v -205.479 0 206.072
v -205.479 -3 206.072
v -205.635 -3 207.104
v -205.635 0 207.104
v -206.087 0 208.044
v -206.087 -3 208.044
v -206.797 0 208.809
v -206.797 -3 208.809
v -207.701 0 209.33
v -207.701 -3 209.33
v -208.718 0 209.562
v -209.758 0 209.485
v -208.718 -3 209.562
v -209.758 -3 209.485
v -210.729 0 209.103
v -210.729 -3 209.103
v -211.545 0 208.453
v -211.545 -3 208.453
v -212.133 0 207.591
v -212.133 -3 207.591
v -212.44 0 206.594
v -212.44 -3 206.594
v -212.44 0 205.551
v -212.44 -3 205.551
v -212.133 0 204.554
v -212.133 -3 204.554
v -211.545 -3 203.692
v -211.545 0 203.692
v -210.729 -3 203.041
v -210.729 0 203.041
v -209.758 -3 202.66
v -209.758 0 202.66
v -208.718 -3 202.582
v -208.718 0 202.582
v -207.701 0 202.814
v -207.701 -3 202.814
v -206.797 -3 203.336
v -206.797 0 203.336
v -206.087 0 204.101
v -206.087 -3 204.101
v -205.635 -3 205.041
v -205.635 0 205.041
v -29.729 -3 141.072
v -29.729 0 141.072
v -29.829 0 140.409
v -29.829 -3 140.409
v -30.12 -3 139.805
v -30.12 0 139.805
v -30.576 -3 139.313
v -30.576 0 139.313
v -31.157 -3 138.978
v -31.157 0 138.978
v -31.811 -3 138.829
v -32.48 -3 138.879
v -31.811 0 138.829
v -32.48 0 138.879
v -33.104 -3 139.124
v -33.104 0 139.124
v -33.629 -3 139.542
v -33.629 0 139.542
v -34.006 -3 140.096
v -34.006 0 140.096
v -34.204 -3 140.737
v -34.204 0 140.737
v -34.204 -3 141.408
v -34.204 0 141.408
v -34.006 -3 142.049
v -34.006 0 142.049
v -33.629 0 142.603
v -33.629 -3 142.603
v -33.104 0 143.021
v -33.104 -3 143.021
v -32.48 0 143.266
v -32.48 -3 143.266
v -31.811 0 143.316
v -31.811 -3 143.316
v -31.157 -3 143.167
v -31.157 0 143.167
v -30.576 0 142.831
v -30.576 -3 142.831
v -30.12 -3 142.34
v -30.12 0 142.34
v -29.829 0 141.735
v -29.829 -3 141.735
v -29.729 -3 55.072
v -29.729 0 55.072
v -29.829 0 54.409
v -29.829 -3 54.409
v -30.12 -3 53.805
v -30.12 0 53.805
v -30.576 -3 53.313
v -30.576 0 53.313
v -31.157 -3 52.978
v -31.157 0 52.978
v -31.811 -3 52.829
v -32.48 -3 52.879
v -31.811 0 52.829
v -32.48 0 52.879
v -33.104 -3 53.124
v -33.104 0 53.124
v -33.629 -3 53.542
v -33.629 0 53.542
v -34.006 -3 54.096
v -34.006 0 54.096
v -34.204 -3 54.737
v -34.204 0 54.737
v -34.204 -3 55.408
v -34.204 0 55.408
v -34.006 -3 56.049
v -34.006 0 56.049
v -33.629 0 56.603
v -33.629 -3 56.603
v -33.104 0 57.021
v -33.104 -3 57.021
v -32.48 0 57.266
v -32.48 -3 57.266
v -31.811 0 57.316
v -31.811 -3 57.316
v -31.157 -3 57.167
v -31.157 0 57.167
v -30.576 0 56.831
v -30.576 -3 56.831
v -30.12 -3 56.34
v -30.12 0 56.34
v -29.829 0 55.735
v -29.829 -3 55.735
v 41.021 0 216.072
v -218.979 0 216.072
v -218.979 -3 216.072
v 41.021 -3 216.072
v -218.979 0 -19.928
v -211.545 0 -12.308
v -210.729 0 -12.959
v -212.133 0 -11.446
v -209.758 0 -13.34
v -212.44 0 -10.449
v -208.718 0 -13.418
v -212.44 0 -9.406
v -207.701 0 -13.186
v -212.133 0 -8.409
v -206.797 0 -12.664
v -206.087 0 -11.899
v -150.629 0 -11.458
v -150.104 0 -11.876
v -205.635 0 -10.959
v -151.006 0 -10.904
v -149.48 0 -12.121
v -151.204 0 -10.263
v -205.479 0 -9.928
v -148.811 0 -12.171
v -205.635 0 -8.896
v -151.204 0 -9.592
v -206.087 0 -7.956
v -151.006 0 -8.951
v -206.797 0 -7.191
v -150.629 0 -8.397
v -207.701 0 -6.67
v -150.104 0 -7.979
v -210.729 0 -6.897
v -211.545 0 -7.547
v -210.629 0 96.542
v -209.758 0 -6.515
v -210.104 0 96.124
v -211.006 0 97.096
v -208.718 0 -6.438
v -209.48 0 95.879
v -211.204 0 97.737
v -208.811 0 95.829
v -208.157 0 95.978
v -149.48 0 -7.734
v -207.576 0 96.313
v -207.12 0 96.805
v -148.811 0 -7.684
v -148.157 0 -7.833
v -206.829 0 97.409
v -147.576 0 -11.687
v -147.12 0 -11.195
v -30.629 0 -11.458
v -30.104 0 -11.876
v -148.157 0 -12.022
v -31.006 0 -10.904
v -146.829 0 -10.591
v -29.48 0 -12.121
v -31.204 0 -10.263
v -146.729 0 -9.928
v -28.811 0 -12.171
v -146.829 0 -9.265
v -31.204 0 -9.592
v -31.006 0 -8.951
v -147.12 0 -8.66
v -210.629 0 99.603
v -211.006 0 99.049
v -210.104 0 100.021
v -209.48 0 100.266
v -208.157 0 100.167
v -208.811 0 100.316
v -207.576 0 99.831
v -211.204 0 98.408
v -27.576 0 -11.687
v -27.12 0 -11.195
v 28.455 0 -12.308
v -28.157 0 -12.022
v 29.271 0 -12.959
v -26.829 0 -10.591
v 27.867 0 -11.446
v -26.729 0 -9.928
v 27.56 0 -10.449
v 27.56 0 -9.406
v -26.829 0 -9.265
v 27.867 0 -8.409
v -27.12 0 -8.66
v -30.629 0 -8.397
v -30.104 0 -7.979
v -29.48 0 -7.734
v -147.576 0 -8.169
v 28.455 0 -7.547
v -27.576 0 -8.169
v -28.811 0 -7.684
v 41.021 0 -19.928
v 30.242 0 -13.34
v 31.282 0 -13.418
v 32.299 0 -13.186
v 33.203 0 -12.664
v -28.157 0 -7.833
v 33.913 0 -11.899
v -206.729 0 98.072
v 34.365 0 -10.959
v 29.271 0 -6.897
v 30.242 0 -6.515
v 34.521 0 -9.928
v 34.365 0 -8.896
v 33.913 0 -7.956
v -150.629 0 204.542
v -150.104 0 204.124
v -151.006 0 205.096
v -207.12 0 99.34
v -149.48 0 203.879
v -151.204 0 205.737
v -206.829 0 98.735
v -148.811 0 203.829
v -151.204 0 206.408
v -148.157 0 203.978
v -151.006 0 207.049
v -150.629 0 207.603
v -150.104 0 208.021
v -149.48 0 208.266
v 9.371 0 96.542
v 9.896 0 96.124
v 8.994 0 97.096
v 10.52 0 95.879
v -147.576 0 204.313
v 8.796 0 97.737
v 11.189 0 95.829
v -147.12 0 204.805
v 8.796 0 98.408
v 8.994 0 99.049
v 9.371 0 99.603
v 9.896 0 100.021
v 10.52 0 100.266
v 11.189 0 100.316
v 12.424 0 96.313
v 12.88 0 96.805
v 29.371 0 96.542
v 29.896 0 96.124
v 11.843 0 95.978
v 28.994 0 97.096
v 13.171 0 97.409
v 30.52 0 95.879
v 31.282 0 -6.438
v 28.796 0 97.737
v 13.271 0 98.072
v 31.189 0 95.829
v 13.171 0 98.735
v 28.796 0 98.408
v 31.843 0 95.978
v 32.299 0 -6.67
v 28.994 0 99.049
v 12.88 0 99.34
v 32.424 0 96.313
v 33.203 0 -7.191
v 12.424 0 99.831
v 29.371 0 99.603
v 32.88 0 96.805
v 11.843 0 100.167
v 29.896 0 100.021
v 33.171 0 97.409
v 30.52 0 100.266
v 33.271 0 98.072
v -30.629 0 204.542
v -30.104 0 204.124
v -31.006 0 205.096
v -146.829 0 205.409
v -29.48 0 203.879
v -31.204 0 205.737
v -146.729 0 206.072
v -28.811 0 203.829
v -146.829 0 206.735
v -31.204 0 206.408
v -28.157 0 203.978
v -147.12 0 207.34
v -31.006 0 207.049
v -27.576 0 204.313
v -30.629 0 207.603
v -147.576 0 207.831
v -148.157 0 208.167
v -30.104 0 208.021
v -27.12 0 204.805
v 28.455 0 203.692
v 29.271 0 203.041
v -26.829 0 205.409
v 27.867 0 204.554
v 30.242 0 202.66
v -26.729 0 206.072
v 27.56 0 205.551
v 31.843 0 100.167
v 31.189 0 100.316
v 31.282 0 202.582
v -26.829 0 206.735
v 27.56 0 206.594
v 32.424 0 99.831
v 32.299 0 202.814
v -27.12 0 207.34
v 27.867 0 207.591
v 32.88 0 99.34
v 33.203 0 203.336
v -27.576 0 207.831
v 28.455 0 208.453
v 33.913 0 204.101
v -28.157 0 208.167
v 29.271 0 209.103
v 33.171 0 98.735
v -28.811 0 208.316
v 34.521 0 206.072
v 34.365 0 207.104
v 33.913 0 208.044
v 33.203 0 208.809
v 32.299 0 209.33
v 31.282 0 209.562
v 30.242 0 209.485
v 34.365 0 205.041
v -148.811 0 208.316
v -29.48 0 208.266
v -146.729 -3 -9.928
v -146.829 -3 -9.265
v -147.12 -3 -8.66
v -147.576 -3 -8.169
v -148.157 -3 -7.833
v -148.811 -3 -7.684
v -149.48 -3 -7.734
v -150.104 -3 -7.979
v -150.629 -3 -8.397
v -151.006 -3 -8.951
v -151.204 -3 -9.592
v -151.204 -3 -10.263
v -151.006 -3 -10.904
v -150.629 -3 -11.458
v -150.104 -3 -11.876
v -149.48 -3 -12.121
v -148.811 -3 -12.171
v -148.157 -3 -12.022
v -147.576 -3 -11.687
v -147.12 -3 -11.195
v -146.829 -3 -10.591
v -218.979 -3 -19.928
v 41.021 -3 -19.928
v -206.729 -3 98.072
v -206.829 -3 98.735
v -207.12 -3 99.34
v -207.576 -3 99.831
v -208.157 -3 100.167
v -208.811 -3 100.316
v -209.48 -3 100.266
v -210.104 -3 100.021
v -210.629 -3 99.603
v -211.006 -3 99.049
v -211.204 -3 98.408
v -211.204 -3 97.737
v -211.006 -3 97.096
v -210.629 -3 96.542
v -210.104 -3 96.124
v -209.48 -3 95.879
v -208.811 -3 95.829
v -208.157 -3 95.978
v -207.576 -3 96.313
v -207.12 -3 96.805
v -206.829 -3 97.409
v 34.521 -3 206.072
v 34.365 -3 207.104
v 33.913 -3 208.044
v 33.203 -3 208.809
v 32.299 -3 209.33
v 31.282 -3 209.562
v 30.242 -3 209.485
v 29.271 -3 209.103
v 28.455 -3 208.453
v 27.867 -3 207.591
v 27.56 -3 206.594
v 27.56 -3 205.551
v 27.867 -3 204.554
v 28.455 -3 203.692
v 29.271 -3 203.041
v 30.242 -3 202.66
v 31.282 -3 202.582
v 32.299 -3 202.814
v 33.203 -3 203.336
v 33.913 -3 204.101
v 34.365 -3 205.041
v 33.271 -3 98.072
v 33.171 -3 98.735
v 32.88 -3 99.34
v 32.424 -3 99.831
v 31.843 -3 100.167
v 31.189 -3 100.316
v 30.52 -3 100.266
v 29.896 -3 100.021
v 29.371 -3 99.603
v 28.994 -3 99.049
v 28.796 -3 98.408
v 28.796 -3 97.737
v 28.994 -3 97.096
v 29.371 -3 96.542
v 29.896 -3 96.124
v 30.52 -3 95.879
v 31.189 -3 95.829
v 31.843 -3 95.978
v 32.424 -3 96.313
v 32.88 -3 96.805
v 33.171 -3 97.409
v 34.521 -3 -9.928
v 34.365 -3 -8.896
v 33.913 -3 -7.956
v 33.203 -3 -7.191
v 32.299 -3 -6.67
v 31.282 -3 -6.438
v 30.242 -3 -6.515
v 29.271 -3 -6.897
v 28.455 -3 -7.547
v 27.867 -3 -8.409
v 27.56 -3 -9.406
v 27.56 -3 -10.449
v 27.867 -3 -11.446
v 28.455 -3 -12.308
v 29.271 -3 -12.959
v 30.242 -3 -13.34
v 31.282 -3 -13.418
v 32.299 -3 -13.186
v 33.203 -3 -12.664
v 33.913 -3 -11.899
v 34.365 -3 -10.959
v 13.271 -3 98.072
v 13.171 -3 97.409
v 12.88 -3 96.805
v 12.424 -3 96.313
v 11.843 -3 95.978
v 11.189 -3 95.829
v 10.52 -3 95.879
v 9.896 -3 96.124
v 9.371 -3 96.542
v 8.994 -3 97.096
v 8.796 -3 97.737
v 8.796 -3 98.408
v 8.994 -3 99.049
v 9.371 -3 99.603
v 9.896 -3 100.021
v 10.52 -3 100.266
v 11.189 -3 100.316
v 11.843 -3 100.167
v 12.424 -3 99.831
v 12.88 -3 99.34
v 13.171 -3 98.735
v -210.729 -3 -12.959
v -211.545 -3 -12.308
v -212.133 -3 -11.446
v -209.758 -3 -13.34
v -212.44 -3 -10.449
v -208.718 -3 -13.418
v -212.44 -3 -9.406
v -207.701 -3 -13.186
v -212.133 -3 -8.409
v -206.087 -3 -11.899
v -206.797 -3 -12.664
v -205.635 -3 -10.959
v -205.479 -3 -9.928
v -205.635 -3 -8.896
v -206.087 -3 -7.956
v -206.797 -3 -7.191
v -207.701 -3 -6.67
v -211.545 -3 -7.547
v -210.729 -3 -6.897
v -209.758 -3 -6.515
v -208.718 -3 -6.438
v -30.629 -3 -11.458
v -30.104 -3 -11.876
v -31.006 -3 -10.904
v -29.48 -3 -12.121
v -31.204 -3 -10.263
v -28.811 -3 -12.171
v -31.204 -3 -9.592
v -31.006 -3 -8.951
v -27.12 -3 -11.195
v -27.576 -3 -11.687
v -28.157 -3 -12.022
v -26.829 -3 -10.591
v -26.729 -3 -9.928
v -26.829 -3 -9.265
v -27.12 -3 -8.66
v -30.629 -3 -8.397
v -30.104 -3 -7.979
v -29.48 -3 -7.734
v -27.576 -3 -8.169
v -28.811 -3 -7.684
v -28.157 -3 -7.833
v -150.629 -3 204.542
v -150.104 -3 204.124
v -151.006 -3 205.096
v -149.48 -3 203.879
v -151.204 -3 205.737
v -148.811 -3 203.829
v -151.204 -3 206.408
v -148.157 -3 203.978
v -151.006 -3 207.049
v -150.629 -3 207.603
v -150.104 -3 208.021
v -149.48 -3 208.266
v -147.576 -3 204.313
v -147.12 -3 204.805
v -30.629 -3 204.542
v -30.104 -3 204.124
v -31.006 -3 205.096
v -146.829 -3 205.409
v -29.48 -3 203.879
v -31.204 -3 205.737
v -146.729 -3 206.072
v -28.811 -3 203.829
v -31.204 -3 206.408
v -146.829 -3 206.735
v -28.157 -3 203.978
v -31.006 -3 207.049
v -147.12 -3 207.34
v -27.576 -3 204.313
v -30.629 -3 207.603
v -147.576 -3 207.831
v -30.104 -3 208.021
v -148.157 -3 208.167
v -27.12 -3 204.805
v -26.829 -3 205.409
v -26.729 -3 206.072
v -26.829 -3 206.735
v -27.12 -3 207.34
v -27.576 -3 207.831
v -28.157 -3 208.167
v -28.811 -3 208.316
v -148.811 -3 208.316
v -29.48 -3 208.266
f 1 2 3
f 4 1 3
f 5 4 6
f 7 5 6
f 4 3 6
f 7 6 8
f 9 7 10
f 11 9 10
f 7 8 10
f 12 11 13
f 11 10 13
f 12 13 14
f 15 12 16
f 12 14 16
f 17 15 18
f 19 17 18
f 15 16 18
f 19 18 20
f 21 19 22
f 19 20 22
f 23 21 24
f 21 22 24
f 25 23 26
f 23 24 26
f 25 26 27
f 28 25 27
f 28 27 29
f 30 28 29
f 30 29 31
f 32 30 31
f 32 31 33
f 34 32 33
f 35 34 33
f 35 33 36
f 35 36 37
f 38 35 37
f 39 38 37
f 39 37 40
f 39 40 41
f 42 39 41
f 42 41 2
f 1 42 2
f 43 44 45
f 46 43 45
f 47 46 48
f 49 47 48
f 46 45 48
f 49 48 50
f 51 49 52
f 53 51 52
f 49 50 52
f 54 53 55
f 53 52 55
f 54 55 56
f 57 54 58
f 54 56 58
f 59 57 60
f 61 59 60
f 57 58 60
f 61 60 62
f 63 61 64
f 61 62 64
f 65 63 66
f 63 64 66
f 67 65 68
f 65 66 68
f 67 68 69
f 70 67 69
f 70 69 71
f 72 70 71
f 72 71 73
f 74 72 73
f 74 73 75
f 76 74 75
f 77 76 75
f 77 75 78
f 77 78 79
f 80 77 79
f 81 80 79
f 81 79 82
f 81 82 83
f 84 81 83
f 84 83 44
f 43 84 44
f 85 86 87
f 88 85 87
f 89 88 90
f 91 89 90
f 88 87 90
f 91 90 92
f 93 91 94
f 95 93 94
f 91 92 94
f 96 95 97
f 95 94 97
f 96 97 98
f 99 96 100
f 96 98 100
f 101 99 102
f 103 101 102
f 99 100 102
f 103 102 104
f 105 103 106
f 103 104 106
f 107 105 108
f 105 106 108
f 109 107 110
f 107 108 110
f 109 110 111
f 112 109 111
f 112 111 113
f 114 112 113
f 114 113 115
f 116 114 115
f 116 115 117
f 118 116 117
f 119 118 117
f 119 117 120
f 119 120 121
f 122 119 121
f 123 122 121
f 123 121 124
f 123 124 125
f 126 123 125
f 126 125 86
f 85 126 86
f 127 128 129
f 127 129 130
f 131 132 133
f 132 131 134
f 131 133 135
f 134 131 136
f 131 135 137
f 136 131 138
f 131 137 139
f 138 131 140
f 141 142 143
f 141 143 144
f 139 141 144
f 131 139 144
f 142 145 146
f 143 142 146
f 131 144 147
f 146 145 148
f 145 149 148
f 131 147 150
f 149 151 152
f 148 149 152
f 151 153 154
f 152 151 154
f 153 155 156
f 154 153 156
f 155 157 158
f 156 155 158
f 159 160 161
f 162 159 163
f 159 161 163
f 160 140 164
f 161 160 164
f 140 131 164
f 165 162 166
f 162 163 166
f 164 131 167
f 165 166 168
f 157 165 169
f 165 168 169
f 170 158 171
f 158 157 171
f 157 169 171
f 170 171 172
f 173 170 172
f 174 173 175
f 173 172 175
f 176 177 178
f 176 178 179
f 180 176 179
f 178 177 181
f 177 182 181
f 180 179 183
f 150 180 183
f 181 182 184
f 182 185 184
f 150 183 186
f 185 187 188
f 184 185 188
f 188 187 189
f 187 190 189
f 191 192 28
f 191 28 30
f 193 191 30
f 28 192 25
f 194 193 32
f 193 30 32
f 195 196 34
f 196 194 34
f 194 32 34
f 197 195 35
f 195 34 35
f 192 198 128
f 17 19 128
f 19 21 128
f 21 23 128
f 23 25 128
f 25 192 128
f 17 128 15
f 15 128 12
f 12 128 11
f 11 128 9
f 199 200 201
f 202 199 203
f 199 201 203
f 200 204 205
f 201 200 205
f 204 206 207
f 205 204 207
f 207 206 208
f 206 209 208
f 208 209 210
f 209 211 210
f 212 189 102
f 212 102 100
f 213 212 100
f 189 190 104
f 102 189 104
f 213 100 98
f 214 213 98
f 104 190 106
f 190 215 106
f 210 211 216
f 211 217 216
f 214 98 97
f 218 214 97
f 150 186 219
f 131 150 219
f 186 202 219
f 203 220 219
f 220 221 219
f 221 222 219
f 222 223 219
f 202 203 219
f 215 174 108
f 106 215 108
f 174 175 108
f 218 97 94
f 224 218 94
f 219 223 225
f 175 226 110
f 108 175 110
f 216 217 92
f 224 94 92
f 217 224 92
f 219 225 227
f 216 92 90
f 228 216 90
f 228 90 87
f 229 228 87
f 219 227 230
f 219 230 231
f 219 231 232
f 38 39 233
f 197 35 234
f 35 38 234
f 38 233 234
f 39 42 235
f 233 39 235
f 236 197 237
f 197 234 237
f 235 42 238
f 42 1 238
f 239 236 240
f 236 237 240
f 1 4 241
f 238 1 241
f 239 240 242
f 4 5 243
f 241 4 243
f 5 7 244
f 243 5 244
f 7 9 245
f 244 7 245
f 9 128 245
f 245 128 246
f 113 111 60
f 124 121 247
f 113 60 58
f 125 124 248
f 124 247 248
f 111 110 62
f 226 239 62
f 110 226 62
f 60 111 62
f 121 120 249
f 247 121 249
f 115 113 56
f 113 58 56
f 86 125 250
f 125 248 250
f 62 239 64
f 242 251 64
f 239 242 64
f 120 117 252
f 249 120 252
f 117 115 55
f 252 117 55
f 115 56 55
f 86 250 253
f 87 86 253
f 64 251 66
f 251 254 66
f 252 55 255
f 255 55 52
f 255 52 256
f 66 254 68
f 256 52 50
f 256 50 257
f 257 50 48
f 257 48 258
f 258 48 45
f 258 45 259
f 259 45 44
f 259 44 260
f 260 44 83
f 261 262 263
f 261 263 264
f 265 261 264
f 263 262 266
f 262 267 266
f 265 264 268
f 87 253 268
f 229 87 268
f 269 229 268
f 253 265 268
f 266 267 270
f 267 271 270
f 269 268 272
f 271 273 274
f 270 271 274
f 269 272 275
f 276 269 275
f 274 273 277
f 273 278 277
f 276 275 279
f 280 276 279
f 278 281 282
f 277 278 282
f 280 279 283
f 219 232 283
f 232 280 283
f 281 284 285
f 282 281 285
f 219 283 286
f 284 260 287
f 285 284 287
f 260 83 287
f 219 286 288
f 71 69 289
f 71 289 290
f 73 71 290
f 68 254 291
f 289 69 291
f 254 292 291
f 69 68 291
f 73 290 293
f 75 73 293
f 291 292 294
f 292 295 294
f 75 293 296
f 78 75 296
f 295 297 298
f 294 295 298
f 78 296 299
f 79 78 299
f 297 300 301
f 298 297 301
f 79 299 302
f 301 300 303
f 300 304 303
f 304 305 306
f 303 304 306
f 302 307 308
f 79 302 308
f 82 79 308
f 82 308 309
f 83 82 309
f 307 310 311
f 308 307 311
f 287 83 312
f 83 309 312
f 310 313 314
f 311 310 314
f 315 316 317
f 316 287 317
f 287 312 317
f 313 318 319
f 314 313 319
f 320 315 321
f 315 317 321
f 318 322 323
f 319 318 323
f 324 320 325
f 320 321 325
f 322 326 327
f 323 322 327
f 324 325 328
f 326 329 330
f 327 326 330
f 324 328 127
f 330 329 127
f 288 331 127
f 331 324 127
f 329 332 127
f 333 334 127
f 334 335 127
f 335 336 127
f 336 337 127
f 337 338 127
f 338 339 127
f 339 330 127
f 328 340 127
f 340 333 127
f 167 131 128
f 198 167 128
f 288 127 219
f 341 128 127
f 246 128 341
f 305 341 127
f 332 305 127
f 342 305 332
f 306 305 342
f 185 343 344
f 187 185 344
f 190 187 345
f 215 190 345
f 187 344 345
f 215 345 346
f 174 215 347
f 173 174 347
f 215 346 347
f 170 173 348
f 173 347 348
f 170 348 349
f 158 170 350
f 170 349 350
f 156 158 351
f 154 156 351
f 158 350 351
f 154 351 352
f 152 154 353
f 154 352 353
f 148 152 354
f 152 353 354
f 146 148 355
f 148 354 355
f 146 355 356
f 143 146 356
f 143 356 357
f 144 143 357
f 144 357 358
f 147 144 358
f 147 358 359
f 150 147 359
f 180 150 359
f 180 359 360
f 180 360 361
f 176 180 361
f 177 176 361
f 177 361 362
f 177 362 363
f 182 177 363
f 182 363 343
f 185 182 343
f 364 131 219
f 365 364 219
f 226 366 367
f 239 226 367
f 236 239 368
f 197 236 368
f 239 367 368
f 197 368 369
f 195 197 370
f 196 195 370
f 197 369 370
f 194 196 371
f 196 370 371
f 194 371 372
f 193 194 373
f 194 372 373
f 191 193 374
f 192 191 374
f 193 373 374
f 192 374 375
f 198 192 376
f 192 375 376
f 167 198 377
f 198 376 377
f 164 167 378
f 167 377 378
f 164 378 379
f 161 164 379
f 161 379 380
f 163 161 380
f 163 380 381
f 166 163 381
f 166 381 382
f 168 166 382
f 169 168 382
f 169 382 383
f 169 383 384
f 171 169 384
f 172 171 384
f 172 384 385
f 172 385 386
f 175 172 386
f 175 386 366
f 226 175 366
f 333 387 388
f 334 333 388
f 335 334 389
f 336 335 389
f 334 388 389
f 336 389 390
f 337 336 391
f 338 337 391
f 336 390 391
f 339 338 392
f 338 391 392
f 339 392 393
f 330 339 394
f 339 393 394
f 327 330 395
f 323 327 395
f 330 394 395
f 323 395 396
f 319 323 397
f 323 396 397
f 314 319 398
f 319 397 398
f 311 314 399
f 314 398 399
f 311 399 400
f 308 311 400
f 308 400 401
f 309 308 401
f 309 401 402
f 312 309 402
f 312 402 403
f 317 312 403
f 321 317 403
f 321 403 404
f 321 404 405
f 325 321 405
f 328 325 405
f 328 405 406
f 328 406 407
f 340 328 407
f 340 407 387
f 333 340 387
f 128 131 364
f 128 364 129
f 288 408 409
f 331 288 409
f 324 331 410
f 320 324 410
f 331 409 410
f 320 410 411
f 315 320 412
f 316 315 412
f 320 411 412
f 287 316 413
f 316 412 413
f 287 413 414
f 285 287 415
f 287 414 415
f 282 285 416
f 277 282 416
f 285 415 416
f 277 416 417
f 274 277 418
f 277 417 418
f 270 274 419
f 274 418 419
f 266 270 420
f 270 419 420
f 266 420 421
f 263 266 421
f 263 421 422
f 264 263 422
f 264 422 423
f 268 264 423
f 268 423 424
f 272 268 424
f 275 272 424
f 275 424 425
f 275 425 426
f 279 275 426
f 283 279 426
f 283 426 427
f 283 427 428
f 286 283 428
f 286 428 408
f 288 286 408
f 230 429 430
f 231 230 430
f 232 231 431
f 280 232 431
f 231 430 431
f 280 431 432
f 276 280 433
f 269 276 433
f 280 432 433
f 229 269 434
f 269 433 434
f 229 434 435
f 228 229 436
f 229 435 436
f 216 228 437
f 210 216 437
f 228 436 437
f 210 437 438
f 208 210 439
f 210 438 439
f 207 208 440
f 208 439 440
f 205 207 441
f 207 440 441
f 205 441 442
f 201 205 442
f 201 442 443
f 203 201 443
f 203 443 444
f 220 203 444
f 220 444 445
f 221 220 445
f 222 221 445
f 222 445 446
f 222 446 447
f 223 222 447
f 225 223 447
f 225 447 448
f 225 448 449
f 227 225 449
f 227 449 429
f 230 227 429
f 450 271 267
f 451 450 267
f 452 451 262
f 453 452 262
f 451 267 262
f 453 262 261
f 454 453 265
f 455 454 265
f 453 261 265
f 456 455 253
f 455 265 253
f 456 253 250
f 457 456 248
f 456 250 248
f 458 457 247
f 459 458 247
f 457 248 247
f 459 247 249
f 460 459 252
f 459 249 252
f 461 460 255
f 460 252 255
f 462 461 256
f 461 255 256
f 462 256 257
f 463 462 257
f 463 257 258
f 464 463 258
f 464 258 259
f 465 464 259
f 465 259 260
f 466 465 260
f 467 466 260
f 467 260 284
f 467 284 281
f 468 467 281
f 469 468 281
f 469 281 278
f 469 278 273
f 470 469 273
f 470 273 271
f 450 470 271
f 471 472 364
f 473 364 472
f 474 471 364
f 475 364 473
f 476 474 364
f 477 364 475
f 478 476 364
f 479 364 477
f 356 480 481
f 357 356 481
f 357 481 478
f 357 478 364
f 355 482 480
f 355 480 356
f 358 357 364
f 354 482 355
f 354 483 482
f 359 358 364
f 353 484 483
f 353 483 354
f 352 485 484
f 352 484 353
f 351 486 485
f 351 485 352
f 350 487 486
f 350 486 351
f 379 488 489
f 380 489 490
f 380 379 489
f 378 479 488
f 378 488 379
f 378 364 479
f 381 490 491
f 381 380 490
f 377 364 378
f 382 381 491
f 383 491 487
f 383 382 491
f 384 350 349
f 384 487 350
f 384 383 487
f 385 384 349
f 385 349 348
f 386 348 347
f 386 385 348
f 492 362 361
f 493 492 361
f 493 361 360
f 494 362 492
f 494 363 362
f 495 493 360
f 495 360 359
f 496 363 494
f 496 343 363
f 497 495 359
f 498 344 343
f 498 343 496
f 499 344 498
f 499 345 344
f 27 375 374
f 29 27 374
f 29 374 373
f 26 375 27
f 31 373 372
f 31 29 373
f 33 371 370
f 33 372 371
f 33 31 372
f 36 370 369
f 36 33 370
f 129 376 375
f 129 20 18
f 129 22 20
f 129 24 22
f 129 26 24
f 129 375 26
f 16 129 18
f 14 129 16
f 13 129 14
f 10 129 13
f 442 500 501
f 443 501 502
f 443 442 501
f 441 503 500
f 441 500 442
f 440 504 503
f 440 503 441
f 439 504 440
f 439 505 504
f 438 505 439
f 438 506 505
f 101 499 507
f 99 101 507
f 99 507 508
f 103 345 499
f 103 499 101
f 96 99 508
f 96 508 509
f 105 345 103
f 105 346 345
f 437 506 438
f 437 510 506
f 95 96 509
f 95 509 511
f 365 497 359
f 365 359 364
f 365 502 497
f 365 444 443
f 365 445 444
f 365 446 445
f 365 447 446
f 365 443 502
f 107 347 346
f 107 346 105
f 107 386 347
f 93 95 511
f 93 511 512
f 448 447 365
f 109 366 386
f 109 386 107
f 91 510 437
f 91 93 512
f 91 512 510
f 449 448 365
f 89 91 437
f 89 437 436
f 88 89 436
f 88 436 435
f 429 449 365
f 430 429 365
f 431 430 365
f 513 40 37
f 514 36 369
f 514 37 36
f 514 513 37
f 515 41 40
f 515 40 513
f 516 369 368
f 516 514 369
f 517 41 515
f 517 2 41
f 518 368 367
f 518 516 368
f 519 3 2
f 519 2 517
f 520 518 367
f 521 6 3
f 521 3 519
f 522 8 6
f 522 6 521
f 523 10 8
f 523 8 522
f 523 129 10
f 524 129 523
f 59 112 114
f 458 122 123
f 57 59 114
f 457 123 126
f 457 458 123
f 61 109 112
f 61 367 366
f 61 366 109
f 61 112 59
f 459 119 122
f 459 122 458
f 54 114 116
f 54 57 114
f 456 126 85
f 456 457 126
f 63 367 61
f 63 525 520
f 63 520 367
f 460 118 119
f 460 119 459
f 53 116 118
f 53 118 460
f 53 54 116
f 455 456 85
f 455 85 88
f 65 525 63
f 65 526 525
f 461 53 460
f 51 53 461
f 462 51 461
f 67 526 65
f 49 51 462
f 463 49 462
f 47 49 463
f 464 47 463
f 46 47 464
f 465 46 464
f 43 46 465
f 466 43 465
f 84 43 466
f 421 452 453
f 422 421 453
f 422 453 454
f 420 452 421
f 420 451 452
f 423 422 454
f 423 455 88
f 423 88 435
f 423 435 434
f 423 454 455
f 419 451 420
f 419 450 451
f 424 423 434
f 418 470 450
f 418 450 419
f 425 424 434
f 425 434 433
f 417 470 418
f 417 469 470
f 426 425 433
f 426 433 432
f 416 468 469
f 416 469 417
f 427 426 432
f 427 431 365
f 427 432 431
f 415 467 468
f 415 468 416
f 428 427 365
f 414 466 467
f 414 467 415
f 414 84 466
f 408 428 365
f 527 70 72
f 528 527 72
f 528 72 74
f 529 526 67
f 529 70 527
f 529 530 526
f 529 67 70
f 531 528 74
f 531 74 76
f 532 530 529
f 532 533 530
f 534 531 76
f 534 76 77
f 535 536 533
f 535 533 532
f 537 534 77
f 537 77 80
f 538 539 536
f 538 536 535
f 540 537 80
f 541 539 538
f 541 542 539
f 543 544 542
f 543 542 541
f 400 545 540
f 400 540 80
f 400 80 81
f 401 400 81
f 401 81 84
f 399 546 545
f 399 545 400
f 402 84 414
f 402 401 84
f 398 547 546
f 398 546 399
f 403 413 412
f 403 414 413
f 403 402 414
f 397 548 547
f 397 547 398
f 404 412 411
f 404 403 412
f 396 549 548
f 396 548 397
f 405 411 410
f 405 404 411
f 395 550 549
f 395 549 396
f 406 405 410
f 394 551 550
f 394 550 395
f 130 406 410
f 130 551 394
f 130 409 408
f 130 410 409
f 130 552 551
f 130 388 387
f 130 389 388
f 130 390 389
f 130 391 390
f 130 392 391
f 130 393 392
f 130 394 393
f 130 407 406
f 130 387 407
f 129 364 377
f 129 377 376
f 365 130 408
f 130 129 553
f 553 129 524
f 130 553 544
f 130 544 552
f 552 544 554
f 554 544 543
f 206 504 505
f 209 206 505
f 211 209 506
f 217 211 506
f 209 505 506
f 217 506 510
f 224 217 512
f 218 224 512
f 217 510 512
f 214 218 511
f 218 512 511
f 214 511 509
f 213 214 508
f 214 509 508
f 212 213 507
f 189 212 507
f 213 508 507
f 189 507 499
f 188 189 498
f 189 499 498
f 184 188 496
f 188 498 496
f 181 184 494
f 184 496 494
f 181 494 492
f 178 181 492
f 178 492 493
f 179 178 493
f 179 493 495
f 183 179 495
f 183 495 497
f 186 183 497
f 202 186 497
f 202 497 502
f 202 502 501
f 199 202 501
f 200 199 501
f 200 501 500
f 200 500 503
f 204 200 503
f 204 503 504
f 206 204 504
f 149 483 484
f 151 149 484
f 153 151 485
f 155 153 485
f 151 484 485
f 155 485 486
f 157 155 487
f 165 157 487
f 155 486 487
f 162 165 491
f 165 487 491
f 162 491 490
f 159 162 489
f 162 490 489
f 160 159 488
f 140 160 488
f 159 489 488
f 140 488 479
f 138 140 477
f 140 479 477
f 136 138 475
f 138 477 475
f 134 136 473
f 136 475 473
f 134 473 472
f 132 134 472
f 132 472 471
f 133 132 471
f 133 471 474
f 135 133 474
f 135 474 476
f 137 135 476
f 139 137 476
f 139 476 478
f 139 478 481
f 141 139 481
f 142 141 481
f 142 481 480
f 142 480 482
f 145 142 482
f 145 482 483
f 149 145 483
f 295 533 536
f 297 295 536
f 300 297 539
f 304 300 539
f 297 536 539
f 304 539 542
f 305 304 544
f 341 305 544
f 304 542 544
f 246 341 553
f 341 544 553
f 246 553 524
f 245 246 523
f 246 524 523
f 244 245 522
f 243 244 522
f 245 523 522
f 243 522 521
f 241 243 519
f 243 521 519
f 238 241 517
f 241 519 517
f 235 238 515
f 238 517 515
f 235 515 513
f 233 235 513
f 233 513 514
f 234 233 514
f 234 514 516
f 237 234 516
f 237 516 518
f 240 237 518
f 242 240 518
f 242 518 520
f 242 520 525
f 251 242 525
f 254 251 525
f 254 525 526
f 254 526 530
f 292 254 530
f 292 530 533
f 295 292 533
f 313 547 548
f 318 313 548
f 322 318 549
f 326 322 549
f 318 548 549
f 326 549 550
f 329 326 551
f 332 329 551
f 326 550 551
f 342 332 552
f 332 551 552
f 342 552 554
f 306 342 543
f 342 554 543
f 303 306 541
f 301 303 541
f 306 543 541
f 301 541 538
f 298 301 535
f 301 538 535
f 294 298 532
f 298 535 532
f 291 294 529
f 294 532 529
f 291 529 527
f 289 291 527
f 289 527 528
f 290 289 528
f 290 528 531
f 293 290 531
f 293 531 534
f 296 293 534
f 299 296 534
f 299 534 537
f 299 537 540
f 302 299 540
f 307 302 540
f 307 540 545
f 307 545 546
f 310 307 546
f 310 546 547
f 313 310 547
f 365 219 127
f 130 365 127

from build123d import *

# Parameters (mm, degrees)
SKETCH_1_W          = 260
SKETCH_1_H          = 236
EXTRUDE_1_DEPTH     = 3
SKETCH_2_R          = 2.25
SKETCH_2_R_2        = 3.5
CUT_EXTRUDE_1_DEPTH = 4
SKETCH1_R           = 2.25
CUT_EXTRUDE1_DEPTH  = 4


with BuildPart() as part:
    # Эскиз1 → Бобышка-Вытянуть1 (new body)
    with BuildSketch(Plane.XZ):
        with Locations((-88.97919902, 98.072268451)):
            Rectangle(SKETCH_1_W, SKETCH_1_H)
    extrude(amount=EXTRUDE_1_DEPTH)

    # Эскиз2 → Вырез-Вытянуть1 (cut, through all)
    with BuildSketch(Plane.XZ.offset(3)):
        with Locations((-208.97919902, 98.072268451)):
            Circle(SKETCH_2_R)
        with Locations((-148.97919902, -9.927731549)):
            Circle(SKETCH_2_R)
        with Locations((-28.97919902, -9.927731549)):
            Circle(SKETCH_2_R)
        with Locations((31.02080098, 98.072268451)):
            Circle(SKETCH_2_R)
        with Locations((-28.97919902, 206.072268451)):
            Circle(SKETCH_2_R)
        with Locations((-148.97919902, 206.072268451)):
            Circle(SKETCH_2_R)
        with Locations((-208.97919902, -9.927731549)):
            Circle(SKETCH_2_R_2)
        with Locations((-208.97919902, 206.072268451)):
            Circle(SKETCH_2_R_2)
        with Locations((31.02080098, -9.927731549)):
            Circle(SKETCH_2_R_2)
        with Locations((31.02080098, 206.072268451)):
            Circle(SKETCH_2_R_2)
    extrude(amount=-CUT_EXTRUDE_1_DEPTH, mode=Mode.SUBTRACT)

    # Sketch1 → Cut-Extrude1 (cut, through all)
    with BuildSketch(Plane(origin=(0, 0, 0), x_dir=(1, 0, 0), z_dir=(0, 1, 0))):
        with Locations((-31.97919902, -141.072268451)):
            Circle(SKETCH1_R)
        with Locations((11.02080098, -98.072268451)):
            Circle(SKETCH1_R)
        with Locations((-31.97919902, -55.072268451)):
            Circle(SKETCH1_R)
    extrude(amount=-CUT_EXTRUDE1_DEPTH, mode=Mode.SUBTRACT)


solid = part.part
